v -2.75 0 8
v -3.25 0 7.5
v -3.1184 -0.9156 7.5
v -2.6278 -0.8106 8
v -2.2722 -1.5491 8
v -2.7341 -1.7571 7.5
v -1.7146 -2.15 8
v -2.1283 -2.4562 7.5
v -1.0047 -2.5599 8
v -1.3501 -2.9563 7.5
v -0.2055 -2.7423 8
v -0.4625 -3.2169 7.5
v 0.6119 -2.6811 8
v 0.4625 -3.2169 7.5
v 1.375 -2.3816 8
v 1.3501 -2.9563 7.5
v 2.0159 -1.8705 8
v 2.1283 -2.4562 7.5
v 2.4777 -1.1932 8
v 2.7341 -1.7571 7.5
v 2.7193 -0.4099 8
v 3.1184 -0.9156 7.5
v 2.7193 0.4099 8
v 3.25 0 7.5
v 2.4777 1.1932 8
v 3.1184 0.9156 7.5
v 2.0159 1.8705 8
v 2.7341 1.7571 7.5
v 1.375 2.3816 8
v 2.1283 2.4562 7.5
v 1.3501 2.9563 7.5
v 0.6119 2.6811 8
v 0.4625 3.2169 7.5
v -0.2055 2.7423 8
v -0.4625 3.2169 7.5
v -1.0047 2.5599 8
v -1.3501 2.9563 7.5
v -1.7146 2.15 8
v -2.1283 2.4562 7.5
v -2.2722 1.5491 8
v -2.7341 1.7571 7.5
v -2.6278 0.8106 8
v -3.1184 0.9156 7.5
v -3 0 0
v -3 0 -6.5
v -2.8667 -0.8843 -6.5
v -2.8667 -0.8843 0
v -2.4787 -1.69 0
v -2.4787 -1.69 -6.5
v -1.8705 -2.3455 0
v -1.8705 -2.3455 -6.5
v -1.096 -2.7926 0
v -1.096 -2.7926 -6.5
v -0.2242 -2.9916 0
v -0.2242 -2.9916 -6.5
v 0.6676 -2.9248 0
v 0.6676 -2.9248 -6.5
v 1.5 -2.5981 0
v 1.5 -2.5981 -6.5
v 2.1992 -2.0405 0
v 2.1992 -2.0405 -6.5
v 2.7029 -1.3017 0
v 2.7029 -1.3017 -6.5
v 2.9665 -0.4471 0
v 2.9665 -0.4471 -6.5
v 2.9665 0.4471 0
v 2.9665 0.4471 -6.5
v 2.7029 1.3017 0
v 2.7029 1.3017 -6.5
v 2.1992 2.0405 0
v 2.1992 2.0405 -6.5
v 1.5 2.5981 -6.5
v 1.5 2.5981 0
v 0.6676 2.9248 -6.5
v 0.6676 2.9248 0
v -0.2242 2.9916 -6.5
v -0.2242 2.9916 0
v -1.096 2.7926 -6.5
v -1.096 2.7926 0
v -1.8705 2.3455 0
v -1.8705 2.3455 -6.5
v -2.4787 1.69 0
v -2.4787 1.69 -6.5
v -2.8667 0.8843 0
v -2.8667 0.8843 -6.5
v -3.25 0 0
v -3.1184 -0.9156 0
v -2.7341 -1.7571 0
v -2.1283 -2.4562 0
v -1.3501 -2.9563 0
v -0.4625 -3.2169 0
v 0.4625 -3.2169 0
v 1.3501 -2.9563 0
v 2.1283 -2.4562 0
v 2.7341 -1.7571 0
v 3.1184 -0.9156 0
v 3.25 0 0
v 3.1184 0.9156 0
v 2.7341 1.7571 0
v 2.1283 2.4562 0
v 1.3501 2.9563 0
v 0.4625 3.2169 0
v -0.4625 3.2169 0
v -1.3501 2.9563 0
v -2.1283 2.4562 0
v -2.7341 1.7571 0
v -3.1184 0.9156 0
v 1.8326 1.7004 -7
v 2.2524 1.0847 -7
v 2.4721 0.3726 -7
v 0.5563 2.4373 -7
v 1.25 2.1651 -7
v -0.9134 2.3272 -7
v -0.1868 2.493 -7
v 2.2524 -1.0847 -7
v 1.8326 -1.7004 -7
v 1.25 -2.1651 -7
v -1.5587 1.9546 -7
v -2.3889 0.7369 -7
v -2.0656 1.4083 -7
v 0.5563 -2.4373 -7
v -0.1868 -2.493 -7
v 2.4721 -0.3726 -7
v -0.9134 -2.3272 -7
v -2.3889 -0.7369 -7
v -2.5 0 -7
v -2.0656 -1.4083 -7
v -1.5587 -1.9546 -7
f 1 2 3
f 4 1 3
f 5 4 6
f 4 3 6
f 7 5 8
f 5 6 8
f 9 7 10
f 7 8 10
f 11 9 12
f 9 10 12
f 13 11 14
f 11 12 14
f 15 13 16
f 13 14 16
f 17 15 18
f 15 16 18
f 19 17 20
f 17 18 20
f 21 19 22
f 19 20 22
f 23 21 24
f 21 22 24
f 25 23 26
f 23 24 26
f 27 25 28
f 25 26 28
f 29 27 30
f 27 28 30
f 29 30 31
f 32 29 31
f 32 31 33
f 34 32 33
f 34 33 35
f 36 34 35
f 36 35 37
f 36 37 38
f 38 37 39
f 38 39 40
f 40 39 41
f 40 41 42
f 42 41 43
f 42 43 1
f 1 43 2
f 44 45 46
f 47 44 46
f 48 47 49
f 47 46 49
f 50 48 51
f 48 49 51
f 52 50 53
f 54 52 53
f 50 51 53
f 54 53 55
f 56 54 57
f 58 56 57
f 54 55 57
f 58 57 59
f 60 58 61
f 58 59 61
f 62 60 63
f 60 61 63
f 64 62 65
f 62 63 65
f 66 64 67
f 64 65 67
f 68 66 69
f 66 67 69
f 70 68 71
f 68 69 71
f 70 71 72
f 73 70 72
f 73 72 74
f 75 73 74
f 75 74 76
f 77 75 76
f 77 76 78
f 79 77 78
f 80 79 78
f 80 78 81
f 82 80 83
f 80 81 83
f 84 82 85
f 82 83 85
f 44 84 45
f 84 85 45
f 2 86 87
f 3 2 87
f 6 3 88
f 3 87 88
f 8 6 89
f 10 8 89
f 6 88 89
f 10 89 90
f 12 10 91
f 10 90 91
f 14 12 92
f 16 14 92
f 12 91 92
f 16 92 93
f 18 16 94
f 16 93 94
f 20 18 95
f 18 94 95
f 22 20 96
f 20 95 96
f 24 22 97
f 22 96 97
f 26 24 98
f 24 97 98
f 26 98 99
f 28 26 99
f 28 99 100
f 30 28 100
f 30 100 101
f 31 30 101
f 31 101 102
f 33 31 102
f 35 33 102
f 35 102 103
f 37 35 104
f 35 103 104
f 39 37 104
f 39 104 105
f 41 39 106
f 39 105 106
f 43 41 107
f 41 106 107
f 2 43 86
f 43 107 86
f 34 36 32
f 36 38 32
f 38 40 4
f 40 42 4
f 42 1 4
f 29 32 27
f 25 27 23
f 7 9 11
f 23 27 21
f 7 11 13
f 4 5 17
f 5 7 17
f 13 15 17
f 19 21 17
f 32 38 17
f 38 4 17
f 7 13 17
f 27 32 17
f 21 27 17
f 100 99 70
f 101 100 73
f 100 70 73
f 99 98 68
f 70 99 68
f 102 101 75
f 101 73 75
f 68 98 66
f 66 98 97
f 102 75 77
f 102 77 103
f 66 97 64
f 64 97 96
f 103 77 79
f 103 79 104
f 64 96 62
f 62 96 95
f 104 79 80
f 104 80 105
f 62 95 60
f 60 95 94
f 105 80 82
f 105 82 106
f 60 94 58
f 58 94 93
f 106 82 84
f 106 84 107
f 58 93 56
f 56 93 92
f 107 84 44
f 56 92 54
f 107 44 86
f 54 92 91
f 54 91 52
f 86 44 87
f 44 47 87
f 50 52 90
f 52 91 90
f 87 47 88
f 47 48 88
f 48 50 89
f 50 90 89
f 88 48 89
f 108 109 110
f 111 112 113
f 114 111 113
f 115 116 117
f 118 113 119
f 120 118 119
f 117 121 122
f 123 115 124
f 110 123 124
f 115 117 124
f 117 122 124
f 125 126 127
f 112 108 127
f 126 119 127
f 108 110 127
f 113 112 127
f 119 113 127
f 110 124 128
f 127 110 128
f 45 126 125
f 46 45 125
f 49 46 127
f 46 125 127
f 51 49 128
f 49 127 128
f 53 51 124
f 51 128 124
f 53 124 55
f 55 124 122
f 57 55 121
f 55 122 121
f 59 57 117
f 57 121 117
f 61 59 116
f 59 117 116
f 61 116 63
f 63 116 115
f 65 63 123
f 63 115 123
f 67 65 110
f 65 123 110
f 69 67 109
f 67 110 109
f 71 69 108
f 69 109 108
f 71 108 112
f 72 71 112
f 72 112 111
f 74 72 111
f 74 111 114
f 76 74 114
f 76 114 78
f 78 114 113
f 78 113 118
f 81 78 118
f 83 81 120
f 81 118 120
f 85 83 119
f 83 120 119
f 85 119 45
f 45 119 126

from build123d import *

# Parameters (mm, degrees)
F2_SIZE = 0.5
F3_SIZE = 0.5


with BuildPart() as f1:
    # F0 (on Front) → F1 (revolve)
    with BuildSketch(Plane.XZ):
        Polygon((0, -7), (0, 0), (0, 8), (-3.25, 8), (-3.25, 0), (-3, 0), (-3, -7), align=None)
    revolve(axis=Axis((0, 0, 4), (0, 0, 1)))

    # F2
    f2_edges = [f1.edges().sort_by_distance(p)[0] for p in [
        (3.25, 0, 8),
    ]]
    chamfer(f2_edges, length=F2_SIZE)

    # F3
    f3_edges = [f1.edges().sort_by_distance(p)[0] for p in [
        (3, 0, -7),
    ]]
    chamfer(f3_edges, length=F3_SIZE)


solid = f1.part
